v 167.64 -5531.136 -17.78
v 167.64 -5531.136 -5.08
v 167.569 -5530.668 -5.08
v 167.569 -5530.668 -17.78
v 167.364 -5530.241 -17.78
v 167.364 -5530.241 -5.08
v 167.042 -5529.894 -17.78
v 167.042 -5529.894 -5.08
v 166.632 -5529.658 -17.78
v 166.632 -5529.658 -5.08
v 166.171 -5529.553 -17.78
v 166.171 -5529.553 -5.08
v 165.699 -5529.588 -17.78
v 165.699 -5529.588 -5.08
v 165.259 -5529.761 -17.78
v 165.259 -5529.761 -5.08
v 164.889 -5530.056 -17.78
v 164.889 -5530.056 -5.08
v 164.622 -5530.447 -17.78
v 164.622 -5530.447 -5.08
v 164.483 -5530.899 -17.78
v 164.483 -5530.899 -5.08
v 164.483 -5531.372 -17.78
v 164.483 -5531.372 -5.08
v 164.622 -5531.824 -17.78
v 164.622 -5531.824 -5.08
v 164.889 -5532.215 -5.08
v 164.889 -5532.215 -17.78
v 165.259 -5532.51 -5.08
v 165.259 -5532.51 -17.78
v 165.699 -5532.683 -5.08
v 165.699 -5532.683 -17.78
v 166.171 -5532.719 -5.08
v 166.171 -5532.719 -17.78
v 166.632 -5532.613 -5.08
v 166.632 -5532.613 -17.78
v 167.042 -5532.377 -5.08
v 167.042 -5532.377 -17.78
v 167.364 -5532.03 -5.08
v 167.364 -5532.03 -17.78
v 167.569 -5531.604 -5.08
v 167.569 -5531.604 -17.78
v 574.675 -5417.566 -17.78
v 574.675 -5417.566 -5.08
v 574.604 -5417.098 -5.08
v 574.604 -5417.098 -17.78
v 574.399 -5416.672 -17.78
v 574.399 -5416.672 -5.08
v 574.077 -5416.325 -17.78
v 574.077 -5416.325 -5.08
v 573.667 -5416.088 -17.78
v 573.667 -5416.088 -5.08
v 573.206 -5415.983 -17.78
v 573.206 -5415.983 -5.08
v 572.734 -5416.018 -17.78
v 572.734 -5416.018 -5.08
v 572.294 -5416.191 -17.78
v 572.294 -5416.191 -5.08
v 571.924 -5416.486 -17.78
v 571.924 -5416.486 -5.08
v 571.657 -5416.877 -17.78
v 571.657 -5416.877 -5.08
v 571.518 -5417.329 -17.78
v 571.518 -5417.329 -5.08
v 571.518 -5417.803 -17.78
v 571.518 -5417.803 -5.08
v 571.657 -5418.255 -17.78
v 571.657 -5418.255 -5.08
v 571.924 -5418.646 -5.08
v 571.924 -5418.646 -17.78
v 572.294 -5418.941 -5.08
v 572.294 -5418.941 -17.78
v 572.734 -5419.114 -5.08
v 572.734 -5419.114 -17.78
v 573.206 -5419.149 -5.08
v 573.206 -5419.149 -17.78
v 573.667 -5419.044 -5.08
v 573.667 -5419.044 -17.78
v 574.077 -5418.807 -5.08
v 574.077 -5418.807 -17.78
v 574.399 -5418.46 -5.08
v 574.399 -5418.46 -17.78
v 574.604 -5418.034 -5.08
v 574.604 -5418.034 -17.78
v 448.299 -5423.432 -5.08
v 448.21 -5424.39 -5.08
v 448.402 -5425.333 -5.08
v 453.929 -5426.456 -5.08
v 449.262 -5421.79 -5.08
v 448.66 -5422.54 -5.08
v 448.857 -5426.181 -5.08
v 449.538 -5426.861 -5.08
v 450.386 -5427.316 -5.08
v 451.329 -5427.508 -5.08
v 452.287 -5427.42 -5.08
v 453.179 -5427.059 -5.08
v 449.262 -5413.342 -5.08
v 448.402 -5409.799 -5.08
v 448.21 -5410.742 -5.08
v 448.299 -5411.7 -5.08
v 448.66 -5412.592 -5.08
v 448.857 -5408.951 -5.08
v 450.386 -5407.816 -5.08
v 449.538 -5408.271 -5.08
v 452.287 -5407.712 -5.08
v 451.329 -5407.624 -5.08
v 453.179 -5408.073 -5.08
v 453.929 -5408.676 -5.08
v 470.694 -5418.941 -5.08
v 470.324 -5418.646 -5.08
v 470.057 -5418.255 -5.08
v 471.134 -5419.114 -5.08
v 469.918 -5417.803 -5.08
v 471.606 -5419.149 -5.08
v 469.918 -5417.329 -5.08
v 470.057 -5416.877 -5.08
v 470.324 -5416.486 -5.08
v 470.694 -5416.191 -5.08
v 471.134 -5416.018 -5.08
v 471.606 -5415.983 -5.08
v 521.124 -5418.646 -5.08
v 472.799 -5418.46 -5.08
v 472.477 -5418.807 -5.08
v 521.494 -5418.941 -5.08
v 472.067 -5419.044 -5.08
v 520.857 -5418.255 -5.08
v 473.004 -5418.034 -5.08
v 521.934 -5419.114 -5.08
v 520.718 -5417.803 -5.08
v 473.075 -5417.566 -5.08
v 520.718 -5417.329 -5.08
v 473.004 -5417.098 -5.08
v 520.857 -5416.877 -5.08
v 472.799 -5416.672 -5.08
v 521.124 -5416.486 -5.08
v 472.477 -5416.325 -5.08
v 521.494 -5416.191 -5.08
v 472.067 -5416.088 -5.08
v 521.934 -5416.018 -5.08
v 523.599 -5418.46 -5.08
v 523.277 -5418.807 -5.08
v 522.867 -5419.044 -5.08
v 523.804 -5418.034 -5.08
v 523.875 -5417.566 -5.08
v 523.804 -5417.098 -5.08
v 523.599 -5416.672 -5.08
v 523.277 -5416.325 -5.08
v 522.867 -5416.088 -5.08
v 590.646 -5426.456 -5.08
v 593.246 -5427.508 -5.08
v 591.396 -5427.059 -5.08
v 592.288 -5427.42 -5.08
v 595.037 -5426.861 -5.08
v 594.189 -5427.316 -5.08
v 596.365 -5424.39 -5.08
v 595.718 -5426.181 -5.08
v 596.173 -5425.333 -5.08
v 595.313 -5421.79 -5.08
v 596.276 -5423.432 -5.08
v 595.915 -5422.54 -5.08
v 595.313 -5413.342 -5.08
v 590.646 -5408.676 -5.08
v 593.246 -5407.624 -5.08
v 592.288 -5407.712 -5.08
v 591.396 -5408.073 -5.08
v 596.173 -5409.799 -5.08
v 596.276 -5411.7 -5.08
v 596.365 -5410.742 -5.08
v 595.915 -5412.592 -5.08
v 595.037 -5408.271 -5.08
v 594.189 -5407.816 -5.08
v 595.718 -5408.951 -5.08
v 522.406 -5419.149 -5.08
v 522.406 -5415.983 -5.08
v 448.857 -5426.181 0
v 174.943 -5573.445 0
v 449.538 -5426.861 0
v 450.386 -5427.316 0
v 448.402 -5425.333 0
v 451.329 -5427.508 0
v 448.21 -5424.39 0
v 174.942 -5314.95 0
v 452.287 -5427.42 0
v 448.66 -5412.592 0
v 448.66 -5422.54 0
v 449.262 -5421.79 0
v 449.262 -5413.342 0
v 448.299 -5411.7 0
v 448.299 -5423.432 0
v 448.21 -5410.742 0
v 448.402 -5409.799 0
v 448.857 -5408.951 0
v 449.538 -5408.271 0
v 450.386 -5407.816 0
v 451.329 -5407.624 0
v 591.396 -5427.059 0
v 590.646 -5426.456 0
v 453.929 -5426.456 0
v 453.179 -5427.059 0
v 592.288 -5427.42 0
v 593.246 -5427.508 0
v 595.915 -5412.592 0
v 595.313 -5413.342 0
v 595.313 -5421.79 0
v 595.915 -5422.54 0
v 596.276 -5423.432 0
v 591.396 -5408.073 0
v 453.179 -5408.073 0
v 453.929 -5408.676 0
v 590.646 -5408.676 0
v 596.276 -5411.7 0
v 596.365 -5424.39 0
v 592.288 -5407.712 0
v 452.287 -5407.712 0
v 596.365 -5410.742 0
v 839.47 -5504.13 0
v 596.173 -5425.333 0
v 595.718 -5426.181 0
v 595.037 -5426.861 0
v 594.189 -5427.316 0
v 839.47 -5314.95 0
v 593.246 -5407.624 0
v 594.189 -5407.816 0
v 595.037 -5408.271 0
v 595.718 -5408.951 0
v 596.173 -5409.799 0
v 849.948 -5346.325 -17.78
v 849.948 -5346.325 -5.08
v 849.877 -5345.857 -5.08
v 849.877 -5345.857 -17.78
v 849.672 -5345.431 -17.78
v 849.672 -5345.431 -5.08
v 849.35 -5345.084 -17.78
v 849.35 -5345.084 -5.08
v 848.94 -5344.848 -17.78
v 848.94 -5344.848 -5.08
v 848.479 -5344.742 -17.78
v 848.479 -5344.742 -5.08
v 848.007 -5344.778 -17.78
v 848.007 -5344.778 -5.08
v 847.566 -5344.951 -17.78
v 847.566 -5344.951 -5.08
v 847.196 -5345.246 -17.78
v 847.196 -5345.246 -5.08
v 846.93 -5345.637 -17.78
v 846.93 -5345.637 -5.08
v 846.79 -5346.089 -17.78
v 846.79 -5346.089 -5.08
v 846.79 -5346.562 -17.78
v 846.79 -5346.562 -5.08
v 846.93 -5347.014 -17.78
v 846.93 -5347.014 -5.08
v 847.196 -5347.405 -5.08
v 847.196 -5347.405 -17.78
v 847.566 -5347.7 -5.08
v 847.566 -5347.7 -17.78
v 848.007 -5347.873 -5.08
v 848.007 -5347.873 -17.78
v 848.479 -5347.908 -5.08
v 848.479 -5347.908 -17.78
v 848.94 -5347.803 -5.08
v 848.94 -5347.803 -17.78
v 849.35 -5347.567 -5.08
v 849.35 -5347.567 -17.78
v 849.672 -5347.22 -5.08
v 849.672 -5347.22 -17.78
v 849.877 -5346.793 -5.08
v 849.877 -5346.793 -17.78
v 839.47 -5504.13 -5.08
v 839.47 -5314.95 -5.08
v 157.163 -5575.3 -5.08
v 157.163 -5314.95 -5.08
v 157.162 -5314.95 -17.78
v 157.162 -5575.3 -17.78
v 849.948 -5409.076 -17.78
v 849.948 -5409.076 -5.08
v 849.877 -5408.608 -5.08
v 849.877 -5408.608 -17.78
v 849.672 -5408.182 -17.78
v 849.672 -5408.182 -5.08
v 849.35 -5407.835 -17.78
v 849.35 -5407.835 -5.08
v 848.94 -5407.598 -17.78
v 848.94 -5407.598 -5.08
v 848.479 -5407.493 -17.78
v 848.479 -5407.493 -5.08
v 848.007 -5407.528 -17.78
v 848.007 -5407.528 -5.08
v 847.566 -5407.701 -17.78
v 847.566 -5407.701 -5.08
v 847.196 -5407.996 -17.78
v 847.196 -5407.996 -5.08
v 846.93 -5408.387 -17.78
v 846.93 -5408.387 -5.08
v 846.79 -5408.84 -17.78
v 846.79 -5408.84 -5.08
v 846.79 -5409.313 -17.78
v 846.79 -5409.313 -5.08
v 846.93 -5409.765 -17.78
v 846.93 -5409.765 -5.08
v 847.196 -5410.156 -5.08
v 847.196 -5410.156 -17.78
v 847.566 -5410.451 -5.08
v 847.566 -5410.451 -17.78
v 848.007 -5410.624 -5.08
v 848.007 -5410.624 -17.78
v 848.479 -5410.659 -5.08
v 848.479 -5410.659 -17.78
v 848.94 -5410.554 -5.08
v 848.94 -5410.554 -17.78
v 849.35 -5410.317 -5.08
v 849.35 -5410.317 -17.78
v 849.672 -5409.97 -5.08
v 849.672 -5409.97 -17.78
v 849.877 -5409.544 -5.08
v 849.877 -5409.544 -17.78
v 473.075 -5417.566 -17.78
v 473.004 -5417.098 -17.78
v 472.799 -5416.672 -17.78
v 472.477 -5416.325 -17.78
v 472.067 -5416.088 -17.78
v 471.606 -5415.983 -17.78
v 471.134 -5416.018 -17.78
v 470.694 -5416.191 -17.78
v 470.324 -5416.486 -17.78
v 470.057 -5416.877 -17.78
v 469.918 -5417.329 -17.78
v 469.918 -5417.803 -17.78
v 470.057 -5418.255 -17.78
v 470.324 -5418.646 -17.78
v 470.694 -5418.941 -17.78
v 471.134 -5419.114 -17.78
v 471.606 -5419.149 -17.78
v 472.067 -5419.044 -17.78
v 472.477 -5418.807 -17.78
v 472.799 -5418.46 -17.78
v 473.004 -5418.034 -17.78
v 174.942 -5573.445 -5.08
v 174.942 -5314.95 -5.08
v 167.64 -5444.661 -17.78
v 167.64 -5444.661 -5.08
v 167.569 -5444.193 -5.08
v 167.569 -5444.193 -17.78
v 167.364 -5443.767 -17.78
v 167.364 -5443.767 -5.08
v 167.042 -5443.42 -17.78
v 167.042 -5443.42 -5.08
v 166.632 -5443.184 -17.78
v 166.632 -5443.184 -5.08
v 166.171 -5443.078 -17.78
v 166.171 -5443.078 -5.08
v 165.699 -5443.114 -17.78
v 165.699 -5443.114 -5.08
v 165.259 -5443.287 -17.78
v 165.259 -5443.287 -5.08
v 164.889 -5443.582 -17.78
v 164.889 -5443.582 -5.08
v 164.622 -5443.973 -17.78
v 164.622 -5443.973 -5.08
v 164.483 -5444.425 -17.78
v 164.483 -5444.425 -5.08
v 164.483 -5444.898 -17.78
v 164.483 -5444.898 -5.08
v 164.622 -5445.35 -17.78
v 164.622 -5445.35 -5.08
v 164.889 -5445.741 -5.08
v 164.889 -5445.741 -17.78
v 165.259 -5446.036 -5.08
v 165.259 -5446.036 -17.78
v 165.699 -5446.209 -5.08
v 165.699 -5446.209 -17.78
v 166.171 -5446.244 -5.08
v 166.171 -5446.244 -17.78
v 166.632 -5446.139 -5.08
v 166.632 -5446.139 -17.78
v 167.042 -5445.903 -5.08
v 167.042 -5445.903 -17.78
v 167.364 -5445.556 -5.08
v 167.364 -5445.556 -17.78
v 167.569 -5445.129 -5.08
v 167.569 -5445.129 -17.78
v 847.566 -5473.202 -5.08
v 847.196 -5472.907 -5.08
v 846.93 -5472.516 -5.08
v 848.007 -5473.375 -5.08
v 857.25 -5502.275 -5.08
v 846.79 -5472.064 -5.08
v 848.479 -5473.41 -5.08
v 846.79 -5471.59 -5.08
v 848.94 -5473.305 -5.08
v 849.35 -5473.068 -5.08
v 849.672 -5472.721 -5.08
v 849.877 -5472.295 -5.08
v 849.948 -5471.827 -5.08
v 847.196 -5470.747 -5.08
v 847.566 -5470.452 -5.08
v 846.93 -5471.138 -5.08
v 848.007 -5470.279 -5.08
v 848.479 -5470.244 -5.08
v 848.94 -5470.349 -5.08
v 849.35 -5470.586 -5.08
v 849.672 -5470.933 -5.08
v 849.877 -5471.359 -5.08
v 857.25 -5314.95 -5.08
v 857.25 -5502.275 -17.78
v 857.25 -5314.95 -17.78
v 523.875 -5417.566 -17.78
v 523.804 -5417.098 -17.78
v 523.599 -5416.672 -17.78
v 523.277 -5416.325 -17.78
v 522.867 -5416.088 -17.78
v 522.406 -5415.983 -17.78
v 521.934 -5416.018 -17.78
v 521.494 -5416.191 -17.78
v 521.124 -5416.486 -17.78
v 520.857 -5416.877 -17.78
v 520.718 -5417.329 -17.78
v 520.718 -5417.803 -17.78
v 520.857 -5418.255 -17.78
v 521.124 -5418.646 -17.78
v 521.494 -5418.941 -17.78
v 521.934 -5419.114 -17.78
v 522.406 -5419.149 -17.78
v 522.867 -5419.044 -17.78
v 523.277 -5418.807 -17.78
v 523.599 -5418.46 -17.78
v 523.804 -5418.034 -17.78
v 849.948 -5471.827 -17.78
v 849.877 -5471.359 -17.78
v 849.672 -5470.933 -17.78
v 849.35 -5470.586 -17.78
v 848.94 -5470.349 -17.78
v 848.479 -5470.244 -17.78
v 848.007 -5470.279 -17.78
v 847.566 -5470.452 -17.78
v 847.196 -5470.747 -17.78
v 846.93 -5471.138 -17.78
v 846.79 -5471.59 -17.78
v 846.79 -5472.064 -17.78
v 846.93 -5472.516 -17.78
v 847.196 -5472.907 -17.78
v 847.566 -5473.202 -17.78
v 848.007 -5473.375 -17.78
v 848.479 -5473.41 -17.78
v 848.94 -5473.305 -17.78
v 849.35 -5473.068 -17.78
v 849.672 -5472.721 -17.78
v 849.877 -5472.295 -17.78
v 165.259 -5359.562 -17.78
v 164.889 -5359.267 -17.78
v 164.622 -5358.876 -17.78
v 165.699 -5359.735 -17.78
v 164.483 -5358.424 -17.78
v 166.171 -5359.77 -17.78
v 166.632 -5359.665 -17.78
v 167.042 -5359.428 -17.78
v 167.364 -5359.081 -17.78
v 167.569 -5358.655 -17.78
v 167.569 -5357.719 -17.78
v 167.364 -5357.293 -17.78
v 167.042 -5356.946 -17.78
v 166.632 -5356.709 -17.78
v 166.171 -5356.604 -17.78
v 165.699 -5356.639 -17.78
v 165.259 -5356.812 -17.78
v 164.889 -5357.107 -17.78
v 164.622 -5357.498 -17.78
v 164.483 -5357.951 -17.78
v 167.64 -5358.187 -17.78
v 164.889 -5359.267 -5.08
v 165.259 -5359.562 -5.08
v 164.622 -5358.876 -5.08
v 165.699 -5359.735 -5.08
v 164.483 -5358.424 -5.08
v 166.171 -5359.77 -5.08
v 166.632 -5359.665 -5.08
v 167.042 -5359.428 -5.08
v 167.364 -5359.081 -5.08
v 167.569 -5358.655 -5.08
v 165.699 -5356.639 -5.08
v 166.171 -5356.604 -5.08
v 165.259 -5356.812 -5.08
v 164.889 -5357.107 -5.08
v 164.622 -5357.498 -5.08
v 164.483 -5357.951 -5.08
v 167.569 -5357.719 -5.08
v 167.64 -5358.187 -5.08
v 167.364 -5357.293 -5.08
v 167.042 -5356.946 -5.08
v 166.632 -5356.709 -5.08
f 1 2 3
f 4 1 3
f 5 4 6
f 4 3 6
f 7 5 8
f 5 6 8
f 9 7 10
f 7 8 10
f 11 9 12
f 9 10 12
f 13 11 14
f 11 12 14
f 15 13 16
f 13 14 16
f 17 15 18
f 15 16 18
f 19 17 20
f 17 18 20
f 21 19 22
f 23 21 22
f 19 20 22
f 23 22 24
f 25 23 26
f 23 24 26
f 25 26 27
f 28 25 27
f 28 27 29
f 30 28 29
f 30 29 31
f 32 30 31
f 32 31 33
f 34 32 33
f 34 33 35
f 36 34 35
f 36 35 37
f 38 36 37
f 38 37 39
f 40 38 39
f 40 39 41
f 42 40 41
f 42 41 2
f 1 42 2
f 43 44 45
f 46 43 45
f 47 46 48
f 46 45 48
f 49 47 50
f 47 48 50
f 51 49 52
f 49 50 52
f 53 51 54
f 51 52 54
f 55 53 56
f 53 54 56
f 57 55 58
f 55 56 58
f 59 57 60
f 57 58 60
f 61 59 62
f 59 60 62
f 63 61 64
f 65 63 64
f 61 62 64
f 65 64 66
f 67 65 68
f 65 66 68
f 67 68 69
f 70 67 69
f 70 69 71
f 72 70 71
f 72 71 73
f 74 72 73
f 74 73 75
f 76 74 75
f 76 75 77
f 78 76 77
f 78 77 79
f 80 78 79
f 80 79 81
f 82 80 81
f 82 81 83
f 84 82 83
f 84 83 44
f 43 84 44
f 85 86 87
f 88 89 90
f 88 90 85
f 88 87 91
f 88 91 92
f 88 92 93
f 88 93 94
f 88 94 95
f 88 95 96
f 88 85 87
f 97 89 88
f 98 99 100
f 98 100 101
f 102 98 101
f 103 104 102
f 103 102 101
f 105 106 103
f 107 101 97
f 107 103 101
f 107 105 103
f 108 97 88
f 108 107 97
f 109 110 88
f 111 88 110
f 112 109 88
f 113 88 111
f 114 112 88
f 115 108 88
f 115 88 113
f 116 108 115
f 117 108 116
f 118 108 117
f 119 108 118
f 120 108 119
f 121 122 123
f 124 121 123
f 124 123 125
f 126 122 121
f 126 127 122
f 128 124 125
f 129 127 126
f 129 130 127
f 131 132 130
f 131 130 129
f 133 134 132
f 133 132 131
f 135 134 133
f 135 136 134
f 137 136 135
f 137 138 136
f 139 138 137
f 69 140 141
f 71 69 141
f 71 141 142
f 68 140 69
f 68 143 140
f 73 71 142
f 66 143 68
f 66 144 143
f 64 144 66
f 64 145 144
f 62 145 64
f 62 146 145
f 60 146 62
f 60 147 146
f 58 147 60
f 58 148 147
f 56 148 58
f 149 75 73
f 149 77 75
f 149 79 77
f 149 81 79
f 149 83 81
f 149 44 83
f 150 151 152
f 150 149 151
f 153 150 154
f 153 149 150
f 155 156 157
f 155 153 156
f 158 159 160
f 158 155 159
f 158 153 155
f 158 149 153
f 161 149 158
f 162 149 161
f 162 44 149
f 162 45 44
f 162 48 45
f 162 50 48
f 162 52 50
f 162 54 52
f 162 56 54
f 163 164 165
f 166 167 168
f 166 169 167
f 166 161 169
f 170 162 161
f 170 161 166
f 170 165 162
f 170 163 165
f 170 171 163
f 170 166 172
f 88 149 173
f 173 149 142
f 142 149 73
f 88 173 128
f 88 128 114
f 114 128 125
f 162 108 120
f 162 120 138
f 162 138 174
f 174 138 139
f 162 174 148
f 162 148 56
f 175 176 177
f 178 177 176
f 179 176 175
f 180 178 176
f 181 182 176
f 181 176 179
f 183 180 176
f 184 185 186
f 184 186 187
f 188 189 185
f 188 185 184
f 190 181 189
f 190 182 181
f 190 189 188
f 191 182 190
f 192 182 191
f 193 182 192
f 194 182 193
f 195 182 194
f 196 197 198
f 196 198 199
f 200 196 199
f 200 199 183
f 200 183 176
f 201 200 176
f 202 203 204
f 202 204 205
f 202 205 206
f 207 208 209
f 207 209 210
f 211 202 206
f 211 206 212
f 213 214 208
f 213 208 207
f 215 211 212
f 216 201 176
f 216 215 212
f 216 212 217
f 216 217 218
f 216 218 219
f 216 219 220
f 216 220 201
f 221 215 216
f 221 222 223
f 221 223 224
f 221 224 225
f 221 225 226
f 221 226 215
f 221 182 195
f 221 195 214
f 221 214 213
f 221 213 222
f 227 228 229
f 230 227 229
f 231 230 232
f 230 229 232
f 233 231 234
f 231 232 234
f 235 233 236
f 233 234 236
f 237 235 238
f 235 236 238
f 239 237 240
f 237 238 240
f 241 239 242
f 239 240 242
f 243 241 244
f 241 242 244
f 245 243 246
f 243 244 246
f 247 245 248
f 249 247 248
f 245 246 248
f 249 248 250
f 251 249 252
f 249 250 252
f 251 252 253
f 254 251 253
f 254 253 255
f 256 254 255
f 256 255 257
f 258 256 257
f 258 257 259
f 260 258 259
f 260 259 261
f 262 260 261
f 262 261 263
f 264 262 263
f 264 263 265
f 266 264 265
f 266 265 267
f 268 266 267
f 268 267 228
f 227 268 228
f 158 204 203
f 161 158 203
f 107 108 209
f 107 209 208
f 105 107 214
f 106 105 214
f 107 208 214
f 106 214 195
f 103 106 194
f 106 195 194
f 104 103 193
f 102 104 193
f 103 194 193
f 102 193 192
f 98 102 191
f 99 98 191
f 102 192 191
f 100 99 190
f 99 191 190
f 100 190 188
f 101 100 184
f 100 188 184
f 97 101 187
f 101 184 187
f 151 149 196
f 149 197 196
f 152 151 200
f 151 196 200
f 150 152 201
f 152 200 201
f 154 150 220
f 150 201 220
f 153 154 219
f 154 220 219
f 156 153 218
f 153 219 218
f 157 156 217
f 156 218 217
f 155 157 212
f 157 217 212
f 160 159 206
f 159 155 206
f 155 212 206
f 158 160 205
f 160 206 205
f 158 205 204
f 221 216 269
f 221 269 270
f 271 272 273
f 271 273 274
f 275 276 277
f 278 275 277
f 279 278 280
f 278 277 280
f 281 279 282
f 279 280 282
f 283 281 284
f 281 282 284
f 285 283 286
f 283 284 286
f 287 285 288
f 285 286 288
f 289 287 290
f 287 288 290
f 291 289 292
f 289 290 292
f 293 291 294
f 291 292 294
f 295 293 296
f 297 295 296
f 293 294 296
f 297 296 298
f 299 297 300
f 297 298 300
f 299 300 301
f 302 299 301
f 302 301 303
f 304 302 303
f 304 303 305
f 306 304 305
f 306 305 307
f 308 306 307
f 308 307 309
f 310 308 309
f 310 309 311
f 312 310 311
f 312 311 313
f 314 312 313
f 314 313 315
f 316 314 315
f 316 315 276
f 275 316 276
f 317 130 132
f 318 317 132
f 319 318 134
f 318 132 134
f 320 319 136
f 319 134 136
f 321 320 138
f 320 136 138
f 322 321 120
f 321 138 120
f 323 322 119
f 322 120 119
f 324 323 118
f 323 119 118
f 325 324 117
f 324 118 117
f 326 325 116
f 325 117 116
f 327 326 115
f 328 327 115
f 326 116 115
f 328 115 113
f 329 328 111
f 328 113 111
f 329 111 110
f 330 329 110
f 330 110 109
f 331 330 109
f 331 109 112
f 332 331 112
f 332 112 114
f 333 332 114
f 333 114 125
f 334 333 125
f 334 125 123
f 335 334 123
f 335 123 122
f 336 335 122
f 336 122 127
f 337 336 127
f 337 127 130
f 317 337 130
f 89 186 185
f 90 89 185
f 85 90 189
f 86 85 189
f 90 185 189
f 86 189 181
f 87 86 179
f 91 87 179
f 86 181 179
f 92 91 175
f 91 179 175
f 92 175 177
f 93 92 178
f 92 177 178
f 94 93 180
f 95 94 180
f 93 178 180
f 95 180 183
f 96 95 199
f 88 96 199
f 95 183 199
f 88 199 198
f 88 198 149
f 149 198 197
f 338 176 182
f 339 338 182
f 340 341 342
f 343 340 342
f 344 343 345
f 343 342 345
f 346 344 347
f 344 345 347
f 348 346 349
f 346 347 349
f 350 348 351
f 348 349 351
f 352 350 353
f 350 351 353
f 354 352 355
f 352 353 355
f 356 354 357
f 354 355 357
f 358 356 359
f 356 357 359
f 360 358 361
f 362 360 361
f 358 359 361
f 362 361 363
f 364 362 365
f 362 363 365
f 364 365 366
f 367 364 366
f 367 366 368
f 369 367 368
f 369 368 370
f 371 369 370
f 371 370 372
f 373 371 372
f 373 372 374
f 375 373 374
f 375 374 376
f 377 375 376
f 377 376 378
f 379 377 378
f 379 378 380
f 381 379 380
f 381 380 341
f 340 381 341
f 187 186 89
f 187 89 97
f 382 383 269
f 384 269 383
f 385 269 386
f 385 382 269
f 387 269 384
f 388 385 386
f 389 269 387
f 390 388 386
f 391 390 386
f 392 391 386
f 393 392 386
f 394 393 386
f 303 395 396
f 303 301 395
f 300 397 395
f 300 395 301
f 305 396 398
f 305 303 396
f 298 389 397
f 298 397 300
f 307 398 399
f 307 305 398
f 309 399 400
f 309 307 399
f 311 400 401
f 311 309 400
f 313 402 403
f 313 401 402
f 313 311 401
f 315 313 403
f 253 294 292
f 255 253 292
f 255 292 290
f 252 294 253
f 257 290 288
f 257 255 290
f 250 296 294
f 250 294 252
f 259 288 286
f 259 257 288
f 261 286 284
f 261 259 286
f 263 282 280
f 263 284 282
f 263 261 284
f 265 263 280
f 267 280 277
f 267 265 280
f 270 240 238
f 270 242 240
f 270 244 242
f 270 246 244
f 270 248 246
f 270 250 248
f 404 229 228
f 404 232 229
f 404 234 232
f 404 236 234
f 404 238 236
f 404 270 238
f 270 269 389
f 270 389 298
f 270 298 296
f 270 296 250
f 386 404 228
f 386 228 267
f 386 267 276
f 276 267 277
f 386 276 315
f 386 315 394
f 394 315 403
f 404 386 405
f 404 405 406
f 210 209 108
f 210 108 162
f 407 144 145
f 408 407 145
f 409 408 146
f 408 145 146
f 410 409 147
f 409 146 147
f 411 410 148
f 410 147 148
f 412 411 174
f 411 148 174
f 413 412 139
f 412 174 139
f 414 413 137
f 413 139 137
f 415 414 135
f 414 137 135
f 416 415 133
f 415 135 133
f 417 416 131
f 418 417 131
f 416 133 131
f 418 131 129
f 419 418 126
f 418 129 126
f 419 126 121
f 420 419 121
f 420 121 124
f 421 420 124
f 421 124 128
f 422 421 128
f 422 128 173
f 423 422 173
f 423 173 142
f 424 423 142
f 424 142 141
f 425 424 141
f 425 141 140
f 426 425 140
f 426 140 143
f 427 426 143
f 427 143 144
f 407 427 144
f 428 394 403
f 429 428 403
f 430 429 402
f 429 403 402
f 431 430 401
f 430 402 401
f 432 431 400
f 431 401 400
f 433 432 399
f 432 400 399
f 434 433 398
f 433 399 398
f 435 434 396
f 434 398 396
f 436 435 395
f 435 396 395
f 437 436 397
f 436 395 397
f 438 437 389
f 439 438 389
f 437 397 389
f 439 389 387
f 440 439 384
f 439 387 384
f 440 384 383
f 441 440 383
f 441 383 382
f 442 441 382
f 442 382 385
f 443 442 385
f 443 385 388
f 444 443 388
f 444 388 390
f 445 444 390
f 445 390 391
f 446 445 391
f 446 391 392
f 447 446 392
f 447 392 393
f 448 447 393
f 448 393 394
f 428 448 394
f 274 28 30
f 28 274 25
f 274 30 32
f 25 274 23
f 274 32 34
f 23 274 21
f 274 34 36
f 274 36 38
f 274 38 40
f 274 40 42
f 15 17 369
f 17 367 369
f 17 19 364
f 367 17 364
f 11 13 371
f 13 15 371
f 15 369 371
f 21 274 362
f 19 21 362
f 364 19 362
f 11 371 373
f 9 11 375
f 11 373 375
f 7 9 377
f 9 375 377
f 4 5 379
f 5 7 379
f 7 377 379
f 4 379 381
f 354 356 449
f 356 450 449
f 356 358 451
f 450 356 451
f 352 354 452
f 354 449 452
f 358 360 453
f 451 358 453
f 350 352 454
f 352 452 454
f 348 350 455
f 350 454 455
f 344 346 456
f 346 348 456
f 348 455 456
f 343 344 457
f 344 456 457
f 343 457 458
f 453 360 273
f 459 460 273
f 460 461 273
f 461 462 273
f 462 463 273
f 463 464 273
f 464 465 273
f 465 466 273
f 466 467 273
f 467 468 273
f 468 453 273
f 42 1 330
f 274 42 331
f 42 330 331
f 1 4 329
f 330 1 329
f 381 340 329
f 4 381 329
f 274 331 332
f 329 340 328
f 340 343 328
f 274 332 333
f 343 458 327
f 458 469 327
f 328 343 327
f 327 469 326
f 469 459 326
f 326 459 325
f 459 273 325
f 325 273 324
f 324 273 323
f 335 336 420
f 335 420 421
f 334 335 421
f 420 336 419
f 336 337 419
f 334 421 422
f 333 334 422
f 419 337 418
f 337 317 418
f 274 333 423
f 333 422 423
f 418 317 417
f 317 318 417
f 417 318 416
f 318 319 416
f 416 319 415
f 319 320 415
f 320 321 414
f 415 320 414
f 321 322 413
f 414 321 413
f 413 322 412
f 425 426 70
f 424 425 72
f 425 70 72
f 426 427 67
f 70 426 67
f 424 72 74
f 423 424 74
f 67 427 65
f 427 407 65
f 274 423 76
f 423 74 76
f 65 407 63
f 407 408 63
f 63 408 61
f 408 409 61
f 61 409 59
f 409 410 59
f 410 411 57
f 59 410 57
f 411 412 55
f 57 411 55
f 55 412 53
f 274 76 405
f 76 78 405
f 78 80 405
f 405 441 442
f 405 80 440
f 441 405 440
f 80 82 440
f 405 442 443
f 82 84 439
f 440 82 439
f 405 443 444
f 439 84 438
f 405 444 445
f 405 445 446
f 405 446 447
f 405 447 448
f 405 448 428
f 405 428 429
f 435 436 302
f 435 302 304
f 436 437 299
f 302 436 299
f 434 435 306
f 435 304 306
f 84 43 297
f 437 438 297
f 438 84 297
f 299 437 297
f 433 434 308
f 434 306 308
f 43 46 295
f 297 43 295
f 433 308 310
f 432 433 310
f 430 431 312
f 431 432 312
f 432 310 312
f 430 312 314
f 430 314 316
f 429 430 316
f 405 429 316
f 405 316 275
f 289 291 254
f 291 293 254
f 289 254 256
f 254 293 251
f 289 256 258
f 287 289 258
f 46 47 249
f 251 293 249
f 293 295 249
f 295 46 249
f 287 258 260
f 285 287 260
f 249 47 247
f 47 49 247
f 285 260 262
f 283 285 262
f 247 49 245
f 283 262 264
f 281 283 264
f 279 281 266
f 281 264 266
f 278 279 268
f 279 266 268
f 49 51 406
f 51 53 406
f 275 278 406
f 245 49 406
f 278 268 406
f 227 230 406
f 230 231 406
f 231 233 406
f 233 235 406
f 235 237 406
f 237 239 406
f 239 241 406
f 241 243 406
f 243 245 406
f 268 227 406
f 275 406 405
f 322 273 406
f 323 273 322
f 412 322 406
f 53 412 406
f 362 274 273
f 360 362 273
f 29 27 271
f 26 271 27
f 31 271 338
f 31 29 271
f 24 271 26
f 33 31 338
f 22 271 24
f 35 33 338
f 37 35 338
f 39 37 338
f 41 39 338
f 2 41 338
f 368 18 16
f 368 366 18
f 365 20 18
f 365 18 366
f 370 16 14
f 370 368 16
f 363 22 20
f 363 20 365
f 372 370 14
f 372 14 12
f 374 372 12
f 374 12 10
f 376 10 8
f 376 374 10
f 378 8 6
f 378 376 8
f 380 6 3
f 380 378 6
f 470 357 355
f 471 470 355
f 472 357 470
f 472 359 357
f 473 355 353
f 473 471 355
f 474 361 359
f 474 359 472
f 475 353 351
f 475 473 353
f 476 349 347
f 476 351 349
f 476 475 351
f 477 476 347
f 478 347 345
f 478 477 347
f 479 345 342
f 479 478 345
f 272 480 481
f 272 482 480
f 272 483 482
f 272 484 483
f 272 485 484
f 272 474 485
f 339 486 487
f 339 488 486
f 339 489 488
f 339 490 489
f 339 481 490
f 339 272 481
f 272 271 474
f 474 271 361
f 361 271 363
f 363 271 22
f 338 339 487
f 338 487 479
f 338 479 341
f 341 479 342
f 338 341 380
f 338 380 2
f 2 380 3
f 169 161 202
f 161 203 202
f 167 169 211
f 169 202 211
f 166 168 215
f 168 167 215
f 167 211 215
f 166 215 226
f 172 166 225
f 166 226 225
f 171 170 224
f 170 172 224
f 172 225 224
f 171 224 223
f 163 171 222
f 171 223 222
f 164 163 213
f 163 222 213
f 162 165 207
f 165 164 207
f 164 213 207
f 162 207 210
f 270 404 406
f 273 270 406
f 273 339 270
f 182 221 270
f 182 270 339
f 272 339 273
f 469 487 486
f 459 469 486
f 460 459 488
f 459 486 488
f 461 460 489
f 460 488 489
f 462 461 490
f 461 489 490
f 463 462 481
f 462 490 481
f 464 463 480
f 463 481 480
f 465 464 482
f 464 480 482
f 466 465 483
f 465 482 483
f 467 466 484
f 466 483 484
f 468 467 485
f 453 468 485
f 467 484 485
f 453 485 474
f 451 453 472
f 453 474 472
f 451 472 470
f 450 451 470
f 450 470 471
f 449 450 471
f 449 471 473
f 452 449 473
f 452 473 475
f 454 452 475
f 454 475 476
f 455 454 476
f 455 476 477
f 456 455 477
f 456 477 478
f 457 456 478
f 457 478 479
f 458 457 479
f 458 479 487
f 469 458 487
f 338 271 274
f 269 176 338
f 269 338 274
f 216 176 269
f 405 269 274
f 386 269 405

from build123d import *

# Parameters (mm, degrees)
EXTRUDE1_DEPTH     = 17.78
SKETCH3_R          = 1.5875
CUT_EXTRUDE1_DEPTH = 17.78
SKETCH4_W          = 17.78
SKETCH4_H          = 260.35
SKETCH4_H_2        = 189.179603175
SKETCH4_W_2        = 146.050000002
SKETCH4_H_3        = 17.780000002
CUT_EXTRUDE2_DEPTH = 5.08
SKETCH6_R          = 3.302
CUT_EXTRUDE3_DEPTH = 5.08


with BuildPart() as part:
    # Sketch2 → Extrude1 (new body)
    with BuildSketch(Plane.XY):
        Polygon((857.25, -5502.275), (857.25, -5314.95), (157.1625, -5314.95), (157.1625, -5575.3), align=None)
    extrude(amount=-EXTRUDE1_DEPTH)

    # Sketch3 → Cut-Extrude1 (cut)
    with BuildSketch(Plane.XY):
        with Locations((166.0525, -5531.135582009)):
            Circle(SKETCH3_R)
        with Locations((166.0525, -5444.661349205)):
            Circle(SKETCH3_R)
        with Locations((166.0525, -5358.187116401)):
            Circle(SKETCH3_R)
        with Locations((848.36, -5471.826917991)):
            Circle(SKETCH3_R)
        with Locations((848.36, -5409.076150795)):
            Circle(SKETCH3_R)
        with Locations((848.36, -5346.325383599)):
            Circle(SKETCH3_R)
        with Locations((573.0875, -5417.566)):
            Circle(SKETCH3_R)
        with Locations((522.2875, -5417.566)):
            Circle(SKETCH3_R)
        with Locations((471.4875, -5417.566)):
            Circle(SKETCH3_R)
    extrude(amount=-CUT_EXTRUDE1_DEPTH, mode=Mode.SUBTRACT)

    # Sketch4 → Cut-Extrude2 (cut)
    with BuildSketch(Plane.XY):
        with Locations((166.0525, -5445.125)):
            Rectangle(SKETCH4_W, SKETCH4_H)
        with Locations((848.36, -5409.539801588)):
            Rectangle(SKETCH4_W, SKETCH4_H_2)
        with Locations((522.2875, -5417.566)):
            Rectangle(SKETCH4_W_2, SKETCH4_H_3)
    extrude(amount=-CUT_EXTRUDE2_DEPTH, mode=Mode.SUBTRACT)

    # Sketch6 → Cut-Extrude3 (cut)
    with BuildSketch(Plane.XY):
        with Locations((451.507564029, -5410.921064029)):
            Circle(SKETCH6_R)
        with Locations((451.507564029, -5424.210935971)):
            Circle(SKETCH6_R)
        with Locations((593.067435971, -5424.210935971)):
            Circle(SKETCH6_R)
        with Locations((593.067435971, -5410.921064029)):
            Circle(SKETCH6_R)
    extrude(amount=-CUT_EXTRUDE3_DEPTH, mode=Mode.SUBTRACT)


solid = part.part
